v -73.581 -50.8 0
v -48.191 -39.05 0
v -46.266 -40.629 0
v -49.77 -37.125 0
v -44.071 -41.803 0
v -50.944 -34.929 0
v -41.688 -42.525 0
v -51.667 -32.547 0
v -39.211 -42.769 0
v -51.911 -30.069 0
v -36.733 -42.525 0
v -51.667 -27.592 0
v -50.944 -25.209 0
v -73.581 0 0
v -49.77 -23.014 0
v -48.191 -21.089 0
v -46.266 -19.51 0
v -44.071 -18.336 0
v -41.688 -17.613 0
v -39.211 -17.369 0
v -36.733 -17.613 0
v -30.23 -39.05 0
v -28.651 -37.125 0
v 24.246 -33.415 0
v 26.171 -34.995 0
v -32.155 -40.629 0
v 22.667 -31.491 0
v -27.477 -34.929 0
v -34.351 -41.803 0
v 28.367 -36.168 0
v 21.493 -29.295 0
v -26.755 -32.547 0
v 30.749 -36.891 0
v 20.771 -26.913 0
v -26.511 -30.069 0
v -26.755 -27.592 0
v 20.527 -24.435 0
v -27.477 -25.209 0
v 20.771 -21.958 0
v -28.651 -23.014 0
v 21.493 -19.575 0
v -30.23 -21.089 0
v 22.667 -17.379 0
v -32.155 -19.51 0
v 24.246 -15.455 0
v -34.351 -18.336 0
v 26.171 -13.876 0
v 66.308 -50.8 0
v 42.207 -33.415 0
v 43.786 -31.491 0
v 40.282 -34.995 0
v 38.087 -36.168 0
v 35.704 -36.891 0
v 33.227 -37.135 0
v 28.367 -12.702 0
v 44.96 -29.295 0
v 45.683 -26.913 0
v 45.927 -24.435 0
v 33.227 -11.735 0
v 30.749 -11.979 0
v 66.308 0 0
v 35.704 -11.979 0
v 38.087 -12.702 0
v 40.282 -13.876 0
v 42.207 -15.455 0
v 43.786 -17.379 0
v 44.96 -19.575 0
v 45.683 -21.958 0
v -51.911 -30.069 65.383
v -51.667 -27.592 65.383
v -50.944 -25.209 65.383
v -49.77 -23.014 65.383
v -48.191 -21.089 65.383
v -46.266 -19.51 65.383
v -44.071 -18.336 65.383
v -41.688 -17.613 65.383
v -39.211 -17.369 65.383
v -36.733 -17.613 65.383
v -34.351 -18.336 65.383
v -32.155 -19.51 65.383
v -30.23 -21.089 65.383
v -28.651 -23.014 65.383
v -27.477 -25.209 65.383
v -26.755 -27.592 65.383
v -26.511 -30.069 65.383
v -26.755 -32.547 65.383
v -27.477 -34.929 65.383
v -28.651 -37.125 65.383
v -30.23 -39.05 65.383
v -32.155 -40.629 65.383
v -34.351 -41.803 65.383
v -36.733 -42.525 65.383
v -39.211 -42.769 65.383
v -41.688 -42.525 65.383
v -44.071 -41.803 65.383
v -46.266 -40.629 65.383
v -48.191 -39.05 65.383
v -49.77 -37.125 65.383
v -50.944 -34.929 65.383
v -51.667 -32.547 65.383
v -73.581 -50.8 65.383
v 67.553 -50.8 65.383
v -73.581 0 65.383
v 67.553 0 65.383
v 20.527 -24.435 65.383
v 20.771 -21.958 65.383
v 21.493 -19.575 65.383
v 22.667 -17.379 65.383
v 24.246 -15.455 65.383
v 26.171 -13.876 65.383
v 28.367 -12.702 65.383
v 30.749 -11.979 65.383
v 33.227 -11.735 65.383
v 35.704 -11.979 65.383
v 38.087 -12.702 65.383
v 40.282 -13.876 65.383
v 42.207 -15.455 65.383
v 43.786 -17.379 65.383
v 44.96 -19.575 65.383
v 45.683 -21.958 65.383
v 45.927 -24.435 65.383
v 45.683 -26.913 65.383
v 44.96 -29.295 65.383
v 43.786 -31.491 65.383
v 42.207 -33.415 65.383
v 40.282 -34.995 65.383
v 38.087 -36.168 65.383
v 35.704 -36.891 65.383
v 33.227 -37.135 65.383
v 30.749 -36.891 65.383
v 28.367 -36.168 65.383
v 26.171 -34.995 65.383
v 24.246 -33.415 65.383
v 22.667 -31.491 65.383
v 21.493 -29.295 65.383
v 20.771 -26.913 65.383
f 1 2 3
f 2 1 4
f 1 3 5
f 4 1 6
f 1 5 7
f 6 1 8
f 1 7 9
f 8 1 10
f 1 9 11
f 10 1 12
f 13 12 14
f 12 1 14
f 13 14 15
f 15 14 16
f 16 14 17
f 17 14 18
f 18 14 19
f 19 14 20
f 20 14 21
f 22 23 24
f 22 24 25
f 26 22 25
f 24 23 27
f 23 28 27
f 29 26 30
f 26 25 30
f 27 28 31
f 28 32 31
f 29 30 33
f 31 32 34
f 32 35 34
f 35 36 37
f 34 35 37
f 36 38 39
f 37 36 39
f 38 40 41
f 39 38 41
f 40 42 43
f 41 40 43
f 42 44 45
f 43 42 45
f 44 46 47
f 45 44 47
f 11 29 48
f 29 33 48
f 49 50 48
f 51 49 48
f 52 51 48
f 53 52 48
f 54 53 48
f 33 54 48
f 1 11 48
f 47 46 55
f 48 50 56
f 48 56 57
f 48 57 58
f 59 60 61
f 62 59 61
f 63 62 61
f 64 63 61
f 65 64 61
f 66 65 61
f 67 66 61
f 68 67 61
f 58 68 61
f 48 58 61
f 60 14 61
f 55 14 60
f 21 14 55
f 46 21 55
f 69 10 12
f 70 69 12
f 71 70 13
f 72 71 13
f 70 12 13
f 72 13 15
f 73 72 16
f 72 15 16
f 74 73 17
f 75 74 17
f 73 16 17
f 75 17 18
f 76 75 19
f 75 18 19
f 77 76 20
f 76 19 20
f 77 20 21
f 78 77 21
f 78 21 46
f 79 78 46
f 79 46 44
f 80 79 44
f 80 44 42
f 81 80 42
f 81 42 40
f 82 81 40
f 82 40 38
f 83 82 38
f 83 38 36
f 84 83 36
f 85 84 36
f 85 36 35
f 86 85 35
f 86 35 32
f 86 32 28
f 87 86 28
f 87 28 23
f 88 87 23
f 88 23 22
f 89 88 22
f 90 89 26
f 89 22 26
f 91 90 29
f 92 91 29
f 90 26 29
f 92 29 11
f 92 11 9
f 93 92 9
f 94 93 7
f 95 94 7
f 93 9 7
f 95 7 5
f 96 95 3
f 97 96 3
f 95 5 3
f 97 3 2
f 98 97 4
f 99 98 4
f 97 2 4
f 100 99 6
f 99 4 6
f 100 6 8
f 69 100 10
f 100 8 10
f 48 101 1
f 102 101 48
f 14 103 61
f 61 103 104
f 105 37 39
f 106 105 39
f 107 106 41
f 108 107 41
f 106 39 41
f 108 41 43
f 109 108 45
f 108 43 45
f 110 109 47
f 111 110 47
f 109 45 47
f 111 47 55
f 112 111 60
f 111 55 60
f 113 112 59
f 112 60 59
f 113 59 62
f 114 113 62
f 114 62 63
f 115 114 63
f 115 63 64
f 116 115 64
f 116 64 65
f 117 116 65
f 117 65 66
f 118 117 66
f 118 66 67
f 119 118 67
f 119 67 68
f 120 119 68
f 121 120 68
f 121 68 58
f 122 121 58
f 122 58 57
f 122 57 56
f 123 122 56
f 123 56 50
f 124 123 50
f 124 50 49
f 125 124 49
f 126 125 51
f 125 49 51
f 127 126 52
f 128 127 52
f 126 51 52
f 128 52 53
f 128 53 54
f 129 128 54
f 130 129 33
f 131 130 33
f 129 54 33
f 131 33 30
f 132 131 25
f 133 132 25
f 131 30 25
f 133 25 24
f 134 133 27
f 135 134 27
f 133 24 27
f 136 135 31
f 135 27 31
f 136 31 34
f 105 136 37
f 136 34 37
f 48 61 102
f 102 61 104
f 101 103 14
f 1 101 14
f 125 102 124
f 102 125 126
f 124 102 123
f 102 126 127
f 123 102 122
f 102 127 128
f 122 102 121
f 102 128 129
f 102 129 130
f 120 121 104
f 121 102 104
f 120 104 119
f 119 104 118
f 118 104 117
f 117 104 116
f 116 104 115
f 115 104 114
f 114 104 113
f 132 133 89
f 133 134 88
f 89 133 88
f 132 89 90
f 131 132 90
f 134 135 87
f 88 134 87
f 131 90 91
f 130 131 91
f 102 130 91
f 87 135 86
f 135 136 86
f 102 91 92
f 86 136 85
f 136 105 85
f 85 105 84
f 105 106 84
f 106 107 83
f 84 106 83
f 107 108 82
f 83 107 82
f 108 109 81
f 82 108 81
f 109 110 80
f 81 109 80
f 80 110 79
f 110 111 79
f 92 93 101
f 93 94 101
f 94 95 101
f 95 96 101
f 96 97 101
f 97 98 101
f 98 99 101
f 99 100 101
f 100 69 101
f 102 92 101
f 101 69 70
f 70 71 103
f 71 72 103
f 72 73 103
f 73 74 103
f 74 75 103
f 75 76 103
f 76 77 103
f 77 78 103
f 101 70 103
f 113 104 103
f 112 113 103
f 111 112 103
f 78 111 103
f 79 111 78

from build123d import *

# Parameters (mm, degrees)
F1_DEPTH = 50.8
F3_D     = 25.4
F5_D     = 25.4


with BuildPart() as f1:
    # F0 (on Front) → F1 (new body)
    with BuildSketch(Plane.XZ):
        Polygon((-73.58104, 0), (66.307701, 0), (67.553416, 65.382518), (-73.58104, 65.382518), align=None)
    extrude(amount=F1_DEPTH)

    # F3 (through all)
    with Locations(Plane.XY.offset(65.382518)):
        with Locations((-39.210644, -30.069295)):
            Hole(F3_D / 2)

    # F5 (through all)
    with Locations(Plane.XY.offset(65.382518)):
        with Locations((33.226751, -24.435168)):
            Hole(F5_D / 2)


solid = f1.part
